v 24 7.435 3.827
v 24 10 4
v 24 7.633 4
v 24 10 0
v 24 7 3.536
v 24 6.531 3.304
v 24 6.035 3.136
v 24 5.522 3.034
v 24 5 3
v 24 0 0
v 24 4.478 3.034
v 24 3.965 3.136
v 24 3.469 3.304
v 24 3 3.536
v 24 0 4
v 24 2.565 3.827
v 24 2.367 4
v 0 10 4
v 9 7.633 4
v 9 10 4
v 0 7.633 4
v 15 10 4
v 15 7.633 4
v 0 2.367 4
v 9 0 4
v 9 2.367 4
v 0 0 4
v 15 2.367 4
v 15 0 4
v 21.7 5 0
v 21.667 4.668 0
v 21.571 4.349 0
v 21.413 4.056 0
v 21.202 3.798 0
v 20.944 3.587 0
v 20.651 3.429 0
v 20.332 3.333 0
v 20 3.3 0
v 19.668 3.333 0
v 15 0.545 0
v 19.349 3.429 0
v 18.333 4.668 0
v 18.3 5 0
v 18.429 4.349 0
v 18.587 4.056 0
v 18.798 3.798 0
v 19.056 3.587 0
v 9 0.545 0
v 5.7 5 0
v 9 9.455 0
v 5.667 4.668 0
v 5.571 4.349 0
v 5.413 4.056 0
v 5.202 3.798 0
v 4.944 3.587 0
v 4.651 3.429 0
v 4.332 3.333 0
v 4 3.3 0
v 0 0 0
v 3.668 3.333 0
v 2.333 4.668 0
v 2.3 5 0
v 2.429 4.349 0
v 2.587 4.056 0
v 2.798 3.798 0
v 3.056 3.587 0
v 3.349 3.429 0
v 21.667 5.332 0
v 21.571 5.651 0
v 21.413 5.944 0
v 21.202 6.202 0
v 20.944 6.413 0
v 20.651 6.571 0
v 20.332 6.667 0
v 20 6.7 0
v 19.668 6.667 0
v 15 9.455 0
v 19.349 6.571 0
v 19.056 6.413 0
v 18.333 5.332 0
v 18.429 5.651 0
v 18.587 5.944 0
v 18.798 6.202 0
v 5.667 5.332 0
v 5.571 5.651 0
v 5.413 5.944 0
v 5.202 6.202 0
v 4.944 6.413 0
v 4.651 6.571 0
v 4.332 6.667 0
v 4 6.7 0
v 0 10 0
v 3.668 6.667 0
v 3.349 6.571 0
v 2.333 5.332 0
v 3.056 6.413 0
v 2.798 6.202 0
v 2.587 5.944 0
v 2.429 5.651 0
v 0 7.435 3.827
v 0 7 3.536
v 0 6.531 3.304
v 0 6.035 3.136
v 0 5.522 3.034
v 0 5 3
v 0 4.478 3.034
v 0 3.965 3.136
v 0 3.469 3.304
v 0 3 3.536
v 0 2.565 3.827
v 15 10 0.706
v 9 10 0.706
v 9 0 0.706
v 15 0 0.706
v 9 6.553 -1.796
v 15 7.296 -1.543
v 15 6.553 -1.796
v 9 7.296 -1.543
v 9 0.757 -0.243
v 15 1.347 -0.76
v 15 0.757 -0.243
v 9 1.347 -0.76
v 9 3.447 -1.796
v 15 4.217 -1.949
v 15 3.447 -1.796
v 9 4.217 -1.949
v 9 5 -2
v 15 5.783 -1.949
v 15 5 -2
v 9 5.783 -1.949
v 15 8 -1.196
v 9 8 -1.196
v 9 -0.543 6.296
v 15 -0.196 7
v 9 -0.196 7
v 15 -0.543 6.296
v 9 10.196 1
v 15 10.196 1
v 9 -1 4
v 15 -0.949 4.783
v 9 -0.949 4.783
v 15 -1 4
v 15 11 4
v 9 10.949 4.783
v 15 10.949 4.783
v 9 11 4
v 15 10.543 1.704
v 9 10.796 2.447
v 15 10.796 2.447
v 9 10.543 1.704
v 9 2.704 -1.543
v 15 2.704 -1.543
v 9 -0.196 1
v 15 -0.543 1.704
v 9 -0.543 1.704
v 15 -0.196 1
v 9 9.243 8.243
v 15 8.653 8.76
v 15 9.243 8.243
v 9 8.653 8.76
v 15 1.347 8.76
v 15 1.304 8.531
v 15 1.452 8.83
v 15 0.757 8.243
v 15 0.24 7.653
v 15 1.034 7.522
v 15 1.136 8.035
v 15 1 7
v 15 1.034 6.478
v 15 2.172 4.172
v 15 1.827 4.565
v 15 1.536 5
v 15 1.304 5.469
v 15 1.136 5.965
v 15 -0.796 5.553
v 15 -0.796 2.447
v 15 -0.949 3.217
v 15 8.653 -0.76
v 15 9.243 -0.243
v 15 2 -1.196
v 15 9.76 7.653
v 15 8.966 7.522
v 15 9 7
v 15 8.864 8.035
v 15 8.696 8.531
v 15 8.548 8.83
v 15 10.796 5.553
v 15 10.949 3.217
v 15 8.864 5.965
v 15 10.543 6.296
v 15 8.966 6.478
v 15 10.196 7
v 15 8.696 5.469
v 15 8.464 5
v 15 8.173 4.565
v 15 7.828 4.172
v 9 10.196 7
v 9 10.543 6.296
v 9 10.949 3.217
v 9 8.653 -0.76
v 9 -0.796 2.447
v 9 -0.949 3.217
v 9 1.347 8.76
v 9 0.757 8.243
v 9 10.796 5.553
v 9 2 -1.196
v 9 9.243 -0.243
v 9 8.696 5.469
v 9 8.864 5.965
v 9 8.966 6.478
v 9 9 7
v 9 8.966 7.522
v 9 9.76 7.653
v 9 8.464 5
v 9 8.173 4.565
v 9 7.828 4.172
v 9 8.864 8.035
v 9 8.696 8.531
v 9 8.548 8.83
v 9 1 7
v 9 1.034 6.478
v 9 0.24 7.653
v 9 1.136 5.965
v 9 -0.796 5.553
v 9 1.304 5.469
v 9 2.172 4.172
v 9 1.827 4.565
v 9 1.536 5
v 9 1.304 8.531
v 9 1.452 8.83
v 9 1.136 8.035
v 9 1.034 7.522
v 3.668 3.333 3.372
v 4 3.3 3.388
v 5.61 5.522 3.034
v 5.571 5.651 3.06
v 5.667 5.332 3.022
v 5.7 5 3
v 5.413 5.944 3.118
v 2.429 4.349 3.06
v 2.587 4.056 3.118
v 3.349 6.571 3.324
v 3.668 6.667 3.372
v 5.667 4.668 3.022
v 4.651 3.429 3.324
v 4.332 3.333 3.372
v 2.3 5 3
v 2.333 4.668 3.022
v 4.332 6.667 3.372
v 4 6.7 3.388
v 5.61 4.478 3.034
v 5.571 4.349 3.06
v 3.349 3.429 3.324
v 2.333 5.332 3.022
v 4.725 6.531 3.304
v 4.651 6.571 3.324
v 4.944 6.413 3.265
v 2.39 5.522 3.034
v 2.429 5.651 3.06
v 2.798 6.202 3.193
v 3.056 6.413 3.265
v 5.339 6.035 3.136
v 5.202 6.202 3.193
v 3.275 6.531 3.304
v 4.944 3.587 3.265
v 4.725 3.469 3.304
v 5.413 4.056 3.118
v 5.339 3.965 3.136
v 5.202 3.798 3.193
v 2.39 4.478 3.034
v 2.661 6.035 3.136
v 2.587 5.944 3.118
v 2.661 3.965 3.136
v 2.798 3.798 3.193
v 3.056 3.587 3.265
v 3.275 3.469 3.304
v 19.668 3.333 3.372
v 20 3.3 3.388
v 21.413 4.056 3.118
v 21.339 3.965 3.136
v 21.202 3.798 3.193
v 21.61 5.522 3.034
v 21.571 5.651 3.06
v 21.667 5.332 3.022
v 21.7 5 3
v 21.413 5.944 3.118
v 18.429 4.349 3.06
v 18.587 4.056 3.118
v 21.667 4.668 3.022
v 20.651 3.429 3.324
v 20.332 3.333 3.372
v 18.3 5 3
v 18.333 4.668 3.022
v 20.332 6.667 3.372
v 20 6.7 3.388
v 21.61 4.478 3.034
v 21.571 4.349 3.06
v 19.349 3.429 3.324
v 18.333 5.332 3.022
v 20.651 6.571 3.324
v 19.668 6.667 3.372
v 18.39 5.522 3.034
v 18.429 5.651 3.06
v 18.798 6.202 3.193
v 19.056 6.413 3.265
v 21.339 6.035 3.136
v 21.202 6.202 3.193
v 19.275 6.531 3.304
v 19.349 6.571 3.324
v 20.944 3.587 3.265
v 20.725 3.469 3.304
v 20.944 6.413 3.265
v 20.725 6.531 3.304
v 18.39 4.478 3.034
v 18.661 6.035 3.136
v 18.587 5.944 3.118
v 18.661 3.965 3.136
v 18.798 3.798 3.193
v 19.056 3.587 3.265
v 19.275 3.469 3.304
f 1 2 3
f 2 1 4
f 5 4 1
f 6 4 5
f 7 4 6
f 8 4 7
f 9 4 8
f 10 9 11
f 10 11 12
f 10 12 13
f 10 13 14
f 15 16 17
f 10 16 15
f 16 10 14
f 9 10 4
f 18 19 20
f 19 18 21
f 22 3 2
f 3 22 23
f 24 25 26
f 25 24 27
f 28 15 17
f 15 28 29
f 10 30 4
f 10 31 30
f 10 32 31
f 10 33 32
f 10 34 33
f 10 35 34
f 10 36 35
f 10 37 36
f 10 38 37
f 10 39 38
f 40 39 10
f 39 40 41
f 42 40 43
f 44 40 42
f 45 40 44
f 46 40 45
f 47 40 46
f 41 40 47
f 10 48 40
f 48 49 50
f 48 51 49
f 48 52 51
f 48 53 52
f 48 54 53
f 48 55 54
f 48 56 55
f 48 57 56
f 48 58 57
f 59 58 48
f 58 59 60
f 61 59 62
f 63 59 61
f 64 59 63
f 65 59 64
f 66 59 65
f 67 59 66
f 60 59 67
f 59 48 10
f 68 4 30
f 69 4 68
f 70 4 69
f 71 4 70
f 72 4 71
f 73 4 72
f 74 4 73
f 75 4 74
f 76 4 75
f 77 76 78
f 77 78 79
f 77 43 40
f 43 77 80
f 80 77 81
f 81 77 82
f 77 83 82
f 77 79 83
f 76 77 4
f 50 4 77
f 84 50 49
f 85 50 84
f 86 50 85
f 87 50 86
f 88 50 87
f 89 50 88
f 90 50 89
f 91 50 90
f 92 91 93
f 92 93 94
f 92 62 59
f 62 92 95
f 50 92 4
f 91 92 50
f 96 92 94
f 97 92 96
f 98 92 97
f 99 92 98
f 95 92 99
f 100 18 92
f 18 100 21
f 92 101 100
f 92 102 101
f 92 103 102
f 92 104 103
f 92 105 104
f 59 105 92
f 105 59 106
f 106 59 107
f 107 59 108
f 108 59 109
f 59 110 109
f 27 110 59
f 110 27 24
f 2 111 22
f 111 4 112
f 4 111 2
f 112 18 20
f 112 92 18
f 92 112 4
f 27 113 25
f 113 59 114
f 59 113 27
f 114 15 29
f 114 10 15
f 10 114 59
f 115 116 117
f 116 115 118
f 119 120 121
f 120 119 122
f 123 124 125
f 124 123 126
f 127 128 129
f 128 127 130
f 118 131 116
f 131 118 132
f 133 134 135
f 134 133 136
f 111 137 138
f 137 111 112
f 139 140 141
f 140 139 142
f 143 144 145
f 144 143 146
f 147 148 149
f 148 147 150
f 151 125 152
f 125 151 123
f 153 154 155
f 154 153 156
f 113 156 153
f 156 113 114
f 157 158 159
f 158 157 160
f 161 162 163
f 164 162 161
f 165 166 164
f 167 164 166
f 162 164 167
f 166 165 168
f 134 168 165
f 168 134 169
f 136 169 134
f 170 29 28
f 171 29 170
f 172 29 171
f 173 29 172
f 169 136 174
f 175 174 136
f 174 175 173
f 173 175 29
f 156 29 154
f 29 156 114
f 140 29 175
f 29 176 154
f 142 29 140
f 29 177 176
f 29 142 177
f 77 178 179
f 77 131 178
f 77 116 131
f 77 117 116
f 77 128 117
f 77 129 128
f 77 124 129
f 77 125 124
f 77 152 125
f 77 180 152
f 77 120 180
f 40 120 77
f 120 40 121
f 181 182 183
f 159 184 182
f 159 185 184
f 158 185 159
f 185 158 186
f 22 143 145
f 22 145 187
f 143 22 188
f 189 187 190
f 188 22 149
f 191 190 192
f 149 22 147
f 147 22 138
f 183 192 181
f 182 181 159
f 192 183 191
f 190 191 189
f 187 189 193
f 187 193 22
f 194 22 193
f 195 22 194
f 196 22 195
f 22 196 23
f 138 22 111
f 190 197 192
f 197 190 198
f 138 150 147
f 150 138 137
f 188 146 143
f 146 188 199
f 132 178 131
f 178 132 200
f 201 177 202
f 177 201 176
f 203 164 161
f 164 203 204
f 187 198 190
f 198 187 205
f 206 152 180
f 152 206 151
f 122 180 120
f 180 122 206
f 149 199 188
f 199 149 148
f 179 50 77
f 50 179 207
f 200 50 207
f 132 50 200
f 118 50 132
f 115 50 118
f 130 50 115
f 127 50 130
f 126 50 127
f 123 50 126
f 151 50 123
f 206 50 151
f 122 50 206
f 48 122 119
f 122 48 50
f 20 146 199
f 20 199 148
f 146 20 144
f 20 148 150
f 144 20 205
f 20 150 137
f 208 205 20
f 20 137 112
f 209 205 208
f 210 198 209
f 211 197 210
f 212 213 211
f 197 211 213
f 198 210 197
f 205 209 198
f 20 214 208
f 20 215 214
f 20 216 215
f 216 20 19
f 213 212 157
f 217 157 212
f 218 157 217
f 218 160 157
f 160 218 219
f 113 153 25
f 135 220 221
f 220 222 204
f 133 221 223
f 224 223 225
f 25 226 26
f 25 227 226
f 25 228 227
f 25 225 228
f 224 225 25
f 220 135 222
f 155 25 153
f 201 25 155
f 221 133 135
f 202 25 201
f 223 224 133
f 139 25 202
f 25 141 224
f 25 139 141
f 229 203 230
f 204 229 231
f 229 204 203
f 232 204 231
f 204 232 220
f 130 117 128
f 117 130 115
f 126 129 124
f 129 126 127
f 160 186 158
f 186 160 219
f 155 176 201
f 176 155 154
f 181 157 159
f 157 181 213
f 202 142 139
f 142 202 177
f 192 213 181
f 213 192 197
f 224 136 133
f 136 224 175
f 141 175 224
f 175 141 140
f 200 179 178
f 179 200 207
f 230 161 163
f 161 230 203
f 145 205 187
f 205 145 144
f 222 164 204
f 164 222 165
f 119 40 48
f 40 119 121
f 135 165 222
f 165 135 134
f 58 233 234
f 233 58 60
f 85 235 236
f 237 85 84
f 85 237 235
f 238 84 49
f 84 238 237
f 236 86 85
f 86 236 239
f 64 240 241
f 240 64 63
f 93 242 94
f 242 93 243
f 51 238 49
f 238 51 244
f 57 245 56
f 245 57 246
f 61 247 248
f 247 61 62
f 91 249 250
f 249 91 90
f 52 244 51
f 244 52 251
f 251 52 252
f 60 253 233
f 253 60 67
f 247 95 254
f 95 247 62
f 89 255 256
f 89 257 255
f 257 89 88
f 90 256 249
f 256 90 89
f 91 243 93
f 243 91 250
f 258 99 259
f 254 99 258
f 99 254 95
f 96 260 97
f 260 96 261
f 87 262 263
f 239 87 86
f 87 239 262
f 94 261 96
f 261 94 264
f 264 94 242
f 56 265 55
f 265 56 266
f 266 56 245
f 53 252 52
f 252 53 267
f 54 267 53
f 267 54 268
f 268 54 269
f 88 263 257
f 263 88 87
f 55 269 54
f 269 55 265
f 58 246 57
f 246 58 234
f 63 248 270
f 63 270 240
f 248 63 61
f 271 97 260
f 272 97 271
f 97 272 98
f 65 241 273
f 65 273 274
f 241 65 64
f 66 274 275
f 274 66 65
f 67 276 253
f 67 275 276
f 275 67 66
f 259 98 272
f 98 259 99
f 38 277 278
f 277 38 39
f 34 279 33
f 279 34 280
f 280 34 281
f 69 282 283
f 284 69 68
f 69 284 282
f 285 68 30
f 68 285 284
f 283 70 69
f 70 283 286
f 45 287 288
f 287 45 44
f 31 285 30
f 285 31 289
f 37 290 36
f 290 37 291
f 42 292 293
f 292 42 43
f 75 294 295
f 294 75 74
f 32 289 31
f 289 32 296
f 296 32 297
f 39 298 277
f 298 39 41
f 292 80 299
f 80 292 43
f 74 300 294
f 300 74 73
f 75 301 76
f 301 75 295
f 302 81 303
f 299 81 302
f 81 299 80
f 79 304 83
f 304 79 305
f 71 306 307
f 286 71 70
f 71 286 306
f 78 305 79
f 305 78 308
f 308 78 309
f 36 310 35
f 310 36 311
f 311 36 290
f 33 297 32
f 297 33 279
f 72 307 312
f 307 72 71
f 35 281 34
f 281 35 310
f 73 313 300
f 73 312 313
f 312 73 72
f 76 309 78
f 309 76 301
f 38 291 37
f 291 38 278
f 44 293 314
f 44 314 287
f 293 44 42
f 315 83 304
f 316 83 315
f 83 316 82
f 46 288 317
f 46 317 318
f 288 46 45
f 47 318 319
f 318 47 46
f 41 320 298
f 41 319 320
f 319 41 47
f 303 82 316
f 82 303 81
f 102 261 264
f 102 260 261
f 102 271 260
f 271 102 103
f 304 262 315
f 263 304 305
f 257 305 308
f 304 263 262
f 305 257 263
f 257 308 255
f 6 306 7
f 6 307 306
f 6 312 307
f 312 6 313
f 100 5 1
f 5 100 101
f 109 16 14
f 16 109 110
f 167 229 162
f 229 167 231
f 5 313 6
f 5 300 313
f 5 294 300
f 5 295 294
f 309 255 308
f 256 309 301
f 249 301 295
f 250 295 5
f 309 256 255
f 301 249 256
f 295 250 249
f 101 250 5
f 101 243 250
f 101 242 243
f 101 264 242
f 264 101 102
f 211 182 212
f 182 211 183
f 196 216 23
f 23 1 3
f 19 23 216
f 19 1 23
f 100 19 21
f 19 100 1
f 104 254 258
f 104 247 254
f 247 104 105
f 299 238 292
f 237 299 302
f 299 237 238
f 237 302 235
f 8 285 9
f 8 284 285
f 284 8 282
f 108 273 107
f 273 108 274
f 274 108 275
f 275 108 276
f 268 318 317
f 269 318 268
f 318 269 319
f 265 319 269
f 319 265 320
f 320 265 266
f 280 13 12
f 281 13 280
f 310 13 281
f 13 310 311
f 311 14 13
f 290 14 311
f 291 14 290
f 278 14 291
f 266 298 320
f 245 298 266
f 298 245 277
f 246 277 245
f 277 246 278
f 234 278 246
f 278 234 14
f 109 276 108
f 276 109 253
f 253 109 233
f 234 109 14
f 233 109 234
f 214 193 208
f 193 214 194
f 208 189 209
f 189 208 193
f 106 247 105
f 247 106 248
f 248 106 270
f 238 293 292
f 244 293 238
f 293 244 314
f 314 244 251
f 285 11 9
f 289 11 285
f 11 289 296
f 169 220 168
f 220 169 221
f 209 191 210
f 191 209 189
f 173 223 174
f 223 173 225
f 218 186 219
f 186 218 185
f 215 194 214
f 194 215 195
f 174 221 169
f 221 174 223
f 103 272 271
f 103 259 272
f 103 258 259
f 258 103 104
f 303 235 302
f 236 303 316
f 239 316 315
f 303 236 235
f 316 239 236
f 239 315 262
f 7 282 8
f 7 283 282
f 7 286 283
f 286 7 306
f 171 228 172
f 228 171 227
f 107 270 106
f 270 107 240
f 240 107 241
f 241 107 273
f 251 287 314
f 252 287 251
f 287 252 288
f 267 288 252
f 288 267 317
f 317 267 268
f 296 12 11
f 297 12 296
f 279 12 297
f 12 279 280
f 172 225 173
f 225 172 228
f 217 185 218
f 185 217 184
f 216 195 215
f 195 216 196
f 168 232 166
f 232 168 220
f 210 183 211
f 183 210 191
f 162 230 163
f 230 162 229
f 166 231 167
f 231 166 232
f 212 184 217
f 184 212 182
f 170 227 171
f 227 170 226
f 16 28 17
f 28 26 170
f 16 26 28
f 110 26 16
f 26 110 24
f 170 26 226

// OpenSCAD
// SPDX-License-Identifier: CC-BY-NC-SA-4.0
// cable-clip — single-part project: a printable cable clip.
// Render: make render P=cable-clip

// M3 clearance — ISO 273 medium fit, 3.4mm [B]//VERIFY (named standard, not
// fetched). Inlined: the repo `hardware` lib was removed (#17).
screw_hole = 3.4;

module cable_clip() {
    difference() {
        union() {
            cube([24, 10, 4]);
            translate([12, 5, 4]) rotate([0, 90, 0])
                cylinder(h = 6, r = 6, center = true, $fn = 48);
        }
        translate([4, 5, -1]) cylinder(h = 6, d = screw_hole, $fn = 32);
        translate([20, 5, -1]) cylinder(h = 6, d = screw_hole, $fn = 32);
        translate([12, 5, 7]) rotate([0, 90, 0])
            cylinder(h = 30, r = 4, center = true, $fn = 48);
    }
}

cable_clip();
